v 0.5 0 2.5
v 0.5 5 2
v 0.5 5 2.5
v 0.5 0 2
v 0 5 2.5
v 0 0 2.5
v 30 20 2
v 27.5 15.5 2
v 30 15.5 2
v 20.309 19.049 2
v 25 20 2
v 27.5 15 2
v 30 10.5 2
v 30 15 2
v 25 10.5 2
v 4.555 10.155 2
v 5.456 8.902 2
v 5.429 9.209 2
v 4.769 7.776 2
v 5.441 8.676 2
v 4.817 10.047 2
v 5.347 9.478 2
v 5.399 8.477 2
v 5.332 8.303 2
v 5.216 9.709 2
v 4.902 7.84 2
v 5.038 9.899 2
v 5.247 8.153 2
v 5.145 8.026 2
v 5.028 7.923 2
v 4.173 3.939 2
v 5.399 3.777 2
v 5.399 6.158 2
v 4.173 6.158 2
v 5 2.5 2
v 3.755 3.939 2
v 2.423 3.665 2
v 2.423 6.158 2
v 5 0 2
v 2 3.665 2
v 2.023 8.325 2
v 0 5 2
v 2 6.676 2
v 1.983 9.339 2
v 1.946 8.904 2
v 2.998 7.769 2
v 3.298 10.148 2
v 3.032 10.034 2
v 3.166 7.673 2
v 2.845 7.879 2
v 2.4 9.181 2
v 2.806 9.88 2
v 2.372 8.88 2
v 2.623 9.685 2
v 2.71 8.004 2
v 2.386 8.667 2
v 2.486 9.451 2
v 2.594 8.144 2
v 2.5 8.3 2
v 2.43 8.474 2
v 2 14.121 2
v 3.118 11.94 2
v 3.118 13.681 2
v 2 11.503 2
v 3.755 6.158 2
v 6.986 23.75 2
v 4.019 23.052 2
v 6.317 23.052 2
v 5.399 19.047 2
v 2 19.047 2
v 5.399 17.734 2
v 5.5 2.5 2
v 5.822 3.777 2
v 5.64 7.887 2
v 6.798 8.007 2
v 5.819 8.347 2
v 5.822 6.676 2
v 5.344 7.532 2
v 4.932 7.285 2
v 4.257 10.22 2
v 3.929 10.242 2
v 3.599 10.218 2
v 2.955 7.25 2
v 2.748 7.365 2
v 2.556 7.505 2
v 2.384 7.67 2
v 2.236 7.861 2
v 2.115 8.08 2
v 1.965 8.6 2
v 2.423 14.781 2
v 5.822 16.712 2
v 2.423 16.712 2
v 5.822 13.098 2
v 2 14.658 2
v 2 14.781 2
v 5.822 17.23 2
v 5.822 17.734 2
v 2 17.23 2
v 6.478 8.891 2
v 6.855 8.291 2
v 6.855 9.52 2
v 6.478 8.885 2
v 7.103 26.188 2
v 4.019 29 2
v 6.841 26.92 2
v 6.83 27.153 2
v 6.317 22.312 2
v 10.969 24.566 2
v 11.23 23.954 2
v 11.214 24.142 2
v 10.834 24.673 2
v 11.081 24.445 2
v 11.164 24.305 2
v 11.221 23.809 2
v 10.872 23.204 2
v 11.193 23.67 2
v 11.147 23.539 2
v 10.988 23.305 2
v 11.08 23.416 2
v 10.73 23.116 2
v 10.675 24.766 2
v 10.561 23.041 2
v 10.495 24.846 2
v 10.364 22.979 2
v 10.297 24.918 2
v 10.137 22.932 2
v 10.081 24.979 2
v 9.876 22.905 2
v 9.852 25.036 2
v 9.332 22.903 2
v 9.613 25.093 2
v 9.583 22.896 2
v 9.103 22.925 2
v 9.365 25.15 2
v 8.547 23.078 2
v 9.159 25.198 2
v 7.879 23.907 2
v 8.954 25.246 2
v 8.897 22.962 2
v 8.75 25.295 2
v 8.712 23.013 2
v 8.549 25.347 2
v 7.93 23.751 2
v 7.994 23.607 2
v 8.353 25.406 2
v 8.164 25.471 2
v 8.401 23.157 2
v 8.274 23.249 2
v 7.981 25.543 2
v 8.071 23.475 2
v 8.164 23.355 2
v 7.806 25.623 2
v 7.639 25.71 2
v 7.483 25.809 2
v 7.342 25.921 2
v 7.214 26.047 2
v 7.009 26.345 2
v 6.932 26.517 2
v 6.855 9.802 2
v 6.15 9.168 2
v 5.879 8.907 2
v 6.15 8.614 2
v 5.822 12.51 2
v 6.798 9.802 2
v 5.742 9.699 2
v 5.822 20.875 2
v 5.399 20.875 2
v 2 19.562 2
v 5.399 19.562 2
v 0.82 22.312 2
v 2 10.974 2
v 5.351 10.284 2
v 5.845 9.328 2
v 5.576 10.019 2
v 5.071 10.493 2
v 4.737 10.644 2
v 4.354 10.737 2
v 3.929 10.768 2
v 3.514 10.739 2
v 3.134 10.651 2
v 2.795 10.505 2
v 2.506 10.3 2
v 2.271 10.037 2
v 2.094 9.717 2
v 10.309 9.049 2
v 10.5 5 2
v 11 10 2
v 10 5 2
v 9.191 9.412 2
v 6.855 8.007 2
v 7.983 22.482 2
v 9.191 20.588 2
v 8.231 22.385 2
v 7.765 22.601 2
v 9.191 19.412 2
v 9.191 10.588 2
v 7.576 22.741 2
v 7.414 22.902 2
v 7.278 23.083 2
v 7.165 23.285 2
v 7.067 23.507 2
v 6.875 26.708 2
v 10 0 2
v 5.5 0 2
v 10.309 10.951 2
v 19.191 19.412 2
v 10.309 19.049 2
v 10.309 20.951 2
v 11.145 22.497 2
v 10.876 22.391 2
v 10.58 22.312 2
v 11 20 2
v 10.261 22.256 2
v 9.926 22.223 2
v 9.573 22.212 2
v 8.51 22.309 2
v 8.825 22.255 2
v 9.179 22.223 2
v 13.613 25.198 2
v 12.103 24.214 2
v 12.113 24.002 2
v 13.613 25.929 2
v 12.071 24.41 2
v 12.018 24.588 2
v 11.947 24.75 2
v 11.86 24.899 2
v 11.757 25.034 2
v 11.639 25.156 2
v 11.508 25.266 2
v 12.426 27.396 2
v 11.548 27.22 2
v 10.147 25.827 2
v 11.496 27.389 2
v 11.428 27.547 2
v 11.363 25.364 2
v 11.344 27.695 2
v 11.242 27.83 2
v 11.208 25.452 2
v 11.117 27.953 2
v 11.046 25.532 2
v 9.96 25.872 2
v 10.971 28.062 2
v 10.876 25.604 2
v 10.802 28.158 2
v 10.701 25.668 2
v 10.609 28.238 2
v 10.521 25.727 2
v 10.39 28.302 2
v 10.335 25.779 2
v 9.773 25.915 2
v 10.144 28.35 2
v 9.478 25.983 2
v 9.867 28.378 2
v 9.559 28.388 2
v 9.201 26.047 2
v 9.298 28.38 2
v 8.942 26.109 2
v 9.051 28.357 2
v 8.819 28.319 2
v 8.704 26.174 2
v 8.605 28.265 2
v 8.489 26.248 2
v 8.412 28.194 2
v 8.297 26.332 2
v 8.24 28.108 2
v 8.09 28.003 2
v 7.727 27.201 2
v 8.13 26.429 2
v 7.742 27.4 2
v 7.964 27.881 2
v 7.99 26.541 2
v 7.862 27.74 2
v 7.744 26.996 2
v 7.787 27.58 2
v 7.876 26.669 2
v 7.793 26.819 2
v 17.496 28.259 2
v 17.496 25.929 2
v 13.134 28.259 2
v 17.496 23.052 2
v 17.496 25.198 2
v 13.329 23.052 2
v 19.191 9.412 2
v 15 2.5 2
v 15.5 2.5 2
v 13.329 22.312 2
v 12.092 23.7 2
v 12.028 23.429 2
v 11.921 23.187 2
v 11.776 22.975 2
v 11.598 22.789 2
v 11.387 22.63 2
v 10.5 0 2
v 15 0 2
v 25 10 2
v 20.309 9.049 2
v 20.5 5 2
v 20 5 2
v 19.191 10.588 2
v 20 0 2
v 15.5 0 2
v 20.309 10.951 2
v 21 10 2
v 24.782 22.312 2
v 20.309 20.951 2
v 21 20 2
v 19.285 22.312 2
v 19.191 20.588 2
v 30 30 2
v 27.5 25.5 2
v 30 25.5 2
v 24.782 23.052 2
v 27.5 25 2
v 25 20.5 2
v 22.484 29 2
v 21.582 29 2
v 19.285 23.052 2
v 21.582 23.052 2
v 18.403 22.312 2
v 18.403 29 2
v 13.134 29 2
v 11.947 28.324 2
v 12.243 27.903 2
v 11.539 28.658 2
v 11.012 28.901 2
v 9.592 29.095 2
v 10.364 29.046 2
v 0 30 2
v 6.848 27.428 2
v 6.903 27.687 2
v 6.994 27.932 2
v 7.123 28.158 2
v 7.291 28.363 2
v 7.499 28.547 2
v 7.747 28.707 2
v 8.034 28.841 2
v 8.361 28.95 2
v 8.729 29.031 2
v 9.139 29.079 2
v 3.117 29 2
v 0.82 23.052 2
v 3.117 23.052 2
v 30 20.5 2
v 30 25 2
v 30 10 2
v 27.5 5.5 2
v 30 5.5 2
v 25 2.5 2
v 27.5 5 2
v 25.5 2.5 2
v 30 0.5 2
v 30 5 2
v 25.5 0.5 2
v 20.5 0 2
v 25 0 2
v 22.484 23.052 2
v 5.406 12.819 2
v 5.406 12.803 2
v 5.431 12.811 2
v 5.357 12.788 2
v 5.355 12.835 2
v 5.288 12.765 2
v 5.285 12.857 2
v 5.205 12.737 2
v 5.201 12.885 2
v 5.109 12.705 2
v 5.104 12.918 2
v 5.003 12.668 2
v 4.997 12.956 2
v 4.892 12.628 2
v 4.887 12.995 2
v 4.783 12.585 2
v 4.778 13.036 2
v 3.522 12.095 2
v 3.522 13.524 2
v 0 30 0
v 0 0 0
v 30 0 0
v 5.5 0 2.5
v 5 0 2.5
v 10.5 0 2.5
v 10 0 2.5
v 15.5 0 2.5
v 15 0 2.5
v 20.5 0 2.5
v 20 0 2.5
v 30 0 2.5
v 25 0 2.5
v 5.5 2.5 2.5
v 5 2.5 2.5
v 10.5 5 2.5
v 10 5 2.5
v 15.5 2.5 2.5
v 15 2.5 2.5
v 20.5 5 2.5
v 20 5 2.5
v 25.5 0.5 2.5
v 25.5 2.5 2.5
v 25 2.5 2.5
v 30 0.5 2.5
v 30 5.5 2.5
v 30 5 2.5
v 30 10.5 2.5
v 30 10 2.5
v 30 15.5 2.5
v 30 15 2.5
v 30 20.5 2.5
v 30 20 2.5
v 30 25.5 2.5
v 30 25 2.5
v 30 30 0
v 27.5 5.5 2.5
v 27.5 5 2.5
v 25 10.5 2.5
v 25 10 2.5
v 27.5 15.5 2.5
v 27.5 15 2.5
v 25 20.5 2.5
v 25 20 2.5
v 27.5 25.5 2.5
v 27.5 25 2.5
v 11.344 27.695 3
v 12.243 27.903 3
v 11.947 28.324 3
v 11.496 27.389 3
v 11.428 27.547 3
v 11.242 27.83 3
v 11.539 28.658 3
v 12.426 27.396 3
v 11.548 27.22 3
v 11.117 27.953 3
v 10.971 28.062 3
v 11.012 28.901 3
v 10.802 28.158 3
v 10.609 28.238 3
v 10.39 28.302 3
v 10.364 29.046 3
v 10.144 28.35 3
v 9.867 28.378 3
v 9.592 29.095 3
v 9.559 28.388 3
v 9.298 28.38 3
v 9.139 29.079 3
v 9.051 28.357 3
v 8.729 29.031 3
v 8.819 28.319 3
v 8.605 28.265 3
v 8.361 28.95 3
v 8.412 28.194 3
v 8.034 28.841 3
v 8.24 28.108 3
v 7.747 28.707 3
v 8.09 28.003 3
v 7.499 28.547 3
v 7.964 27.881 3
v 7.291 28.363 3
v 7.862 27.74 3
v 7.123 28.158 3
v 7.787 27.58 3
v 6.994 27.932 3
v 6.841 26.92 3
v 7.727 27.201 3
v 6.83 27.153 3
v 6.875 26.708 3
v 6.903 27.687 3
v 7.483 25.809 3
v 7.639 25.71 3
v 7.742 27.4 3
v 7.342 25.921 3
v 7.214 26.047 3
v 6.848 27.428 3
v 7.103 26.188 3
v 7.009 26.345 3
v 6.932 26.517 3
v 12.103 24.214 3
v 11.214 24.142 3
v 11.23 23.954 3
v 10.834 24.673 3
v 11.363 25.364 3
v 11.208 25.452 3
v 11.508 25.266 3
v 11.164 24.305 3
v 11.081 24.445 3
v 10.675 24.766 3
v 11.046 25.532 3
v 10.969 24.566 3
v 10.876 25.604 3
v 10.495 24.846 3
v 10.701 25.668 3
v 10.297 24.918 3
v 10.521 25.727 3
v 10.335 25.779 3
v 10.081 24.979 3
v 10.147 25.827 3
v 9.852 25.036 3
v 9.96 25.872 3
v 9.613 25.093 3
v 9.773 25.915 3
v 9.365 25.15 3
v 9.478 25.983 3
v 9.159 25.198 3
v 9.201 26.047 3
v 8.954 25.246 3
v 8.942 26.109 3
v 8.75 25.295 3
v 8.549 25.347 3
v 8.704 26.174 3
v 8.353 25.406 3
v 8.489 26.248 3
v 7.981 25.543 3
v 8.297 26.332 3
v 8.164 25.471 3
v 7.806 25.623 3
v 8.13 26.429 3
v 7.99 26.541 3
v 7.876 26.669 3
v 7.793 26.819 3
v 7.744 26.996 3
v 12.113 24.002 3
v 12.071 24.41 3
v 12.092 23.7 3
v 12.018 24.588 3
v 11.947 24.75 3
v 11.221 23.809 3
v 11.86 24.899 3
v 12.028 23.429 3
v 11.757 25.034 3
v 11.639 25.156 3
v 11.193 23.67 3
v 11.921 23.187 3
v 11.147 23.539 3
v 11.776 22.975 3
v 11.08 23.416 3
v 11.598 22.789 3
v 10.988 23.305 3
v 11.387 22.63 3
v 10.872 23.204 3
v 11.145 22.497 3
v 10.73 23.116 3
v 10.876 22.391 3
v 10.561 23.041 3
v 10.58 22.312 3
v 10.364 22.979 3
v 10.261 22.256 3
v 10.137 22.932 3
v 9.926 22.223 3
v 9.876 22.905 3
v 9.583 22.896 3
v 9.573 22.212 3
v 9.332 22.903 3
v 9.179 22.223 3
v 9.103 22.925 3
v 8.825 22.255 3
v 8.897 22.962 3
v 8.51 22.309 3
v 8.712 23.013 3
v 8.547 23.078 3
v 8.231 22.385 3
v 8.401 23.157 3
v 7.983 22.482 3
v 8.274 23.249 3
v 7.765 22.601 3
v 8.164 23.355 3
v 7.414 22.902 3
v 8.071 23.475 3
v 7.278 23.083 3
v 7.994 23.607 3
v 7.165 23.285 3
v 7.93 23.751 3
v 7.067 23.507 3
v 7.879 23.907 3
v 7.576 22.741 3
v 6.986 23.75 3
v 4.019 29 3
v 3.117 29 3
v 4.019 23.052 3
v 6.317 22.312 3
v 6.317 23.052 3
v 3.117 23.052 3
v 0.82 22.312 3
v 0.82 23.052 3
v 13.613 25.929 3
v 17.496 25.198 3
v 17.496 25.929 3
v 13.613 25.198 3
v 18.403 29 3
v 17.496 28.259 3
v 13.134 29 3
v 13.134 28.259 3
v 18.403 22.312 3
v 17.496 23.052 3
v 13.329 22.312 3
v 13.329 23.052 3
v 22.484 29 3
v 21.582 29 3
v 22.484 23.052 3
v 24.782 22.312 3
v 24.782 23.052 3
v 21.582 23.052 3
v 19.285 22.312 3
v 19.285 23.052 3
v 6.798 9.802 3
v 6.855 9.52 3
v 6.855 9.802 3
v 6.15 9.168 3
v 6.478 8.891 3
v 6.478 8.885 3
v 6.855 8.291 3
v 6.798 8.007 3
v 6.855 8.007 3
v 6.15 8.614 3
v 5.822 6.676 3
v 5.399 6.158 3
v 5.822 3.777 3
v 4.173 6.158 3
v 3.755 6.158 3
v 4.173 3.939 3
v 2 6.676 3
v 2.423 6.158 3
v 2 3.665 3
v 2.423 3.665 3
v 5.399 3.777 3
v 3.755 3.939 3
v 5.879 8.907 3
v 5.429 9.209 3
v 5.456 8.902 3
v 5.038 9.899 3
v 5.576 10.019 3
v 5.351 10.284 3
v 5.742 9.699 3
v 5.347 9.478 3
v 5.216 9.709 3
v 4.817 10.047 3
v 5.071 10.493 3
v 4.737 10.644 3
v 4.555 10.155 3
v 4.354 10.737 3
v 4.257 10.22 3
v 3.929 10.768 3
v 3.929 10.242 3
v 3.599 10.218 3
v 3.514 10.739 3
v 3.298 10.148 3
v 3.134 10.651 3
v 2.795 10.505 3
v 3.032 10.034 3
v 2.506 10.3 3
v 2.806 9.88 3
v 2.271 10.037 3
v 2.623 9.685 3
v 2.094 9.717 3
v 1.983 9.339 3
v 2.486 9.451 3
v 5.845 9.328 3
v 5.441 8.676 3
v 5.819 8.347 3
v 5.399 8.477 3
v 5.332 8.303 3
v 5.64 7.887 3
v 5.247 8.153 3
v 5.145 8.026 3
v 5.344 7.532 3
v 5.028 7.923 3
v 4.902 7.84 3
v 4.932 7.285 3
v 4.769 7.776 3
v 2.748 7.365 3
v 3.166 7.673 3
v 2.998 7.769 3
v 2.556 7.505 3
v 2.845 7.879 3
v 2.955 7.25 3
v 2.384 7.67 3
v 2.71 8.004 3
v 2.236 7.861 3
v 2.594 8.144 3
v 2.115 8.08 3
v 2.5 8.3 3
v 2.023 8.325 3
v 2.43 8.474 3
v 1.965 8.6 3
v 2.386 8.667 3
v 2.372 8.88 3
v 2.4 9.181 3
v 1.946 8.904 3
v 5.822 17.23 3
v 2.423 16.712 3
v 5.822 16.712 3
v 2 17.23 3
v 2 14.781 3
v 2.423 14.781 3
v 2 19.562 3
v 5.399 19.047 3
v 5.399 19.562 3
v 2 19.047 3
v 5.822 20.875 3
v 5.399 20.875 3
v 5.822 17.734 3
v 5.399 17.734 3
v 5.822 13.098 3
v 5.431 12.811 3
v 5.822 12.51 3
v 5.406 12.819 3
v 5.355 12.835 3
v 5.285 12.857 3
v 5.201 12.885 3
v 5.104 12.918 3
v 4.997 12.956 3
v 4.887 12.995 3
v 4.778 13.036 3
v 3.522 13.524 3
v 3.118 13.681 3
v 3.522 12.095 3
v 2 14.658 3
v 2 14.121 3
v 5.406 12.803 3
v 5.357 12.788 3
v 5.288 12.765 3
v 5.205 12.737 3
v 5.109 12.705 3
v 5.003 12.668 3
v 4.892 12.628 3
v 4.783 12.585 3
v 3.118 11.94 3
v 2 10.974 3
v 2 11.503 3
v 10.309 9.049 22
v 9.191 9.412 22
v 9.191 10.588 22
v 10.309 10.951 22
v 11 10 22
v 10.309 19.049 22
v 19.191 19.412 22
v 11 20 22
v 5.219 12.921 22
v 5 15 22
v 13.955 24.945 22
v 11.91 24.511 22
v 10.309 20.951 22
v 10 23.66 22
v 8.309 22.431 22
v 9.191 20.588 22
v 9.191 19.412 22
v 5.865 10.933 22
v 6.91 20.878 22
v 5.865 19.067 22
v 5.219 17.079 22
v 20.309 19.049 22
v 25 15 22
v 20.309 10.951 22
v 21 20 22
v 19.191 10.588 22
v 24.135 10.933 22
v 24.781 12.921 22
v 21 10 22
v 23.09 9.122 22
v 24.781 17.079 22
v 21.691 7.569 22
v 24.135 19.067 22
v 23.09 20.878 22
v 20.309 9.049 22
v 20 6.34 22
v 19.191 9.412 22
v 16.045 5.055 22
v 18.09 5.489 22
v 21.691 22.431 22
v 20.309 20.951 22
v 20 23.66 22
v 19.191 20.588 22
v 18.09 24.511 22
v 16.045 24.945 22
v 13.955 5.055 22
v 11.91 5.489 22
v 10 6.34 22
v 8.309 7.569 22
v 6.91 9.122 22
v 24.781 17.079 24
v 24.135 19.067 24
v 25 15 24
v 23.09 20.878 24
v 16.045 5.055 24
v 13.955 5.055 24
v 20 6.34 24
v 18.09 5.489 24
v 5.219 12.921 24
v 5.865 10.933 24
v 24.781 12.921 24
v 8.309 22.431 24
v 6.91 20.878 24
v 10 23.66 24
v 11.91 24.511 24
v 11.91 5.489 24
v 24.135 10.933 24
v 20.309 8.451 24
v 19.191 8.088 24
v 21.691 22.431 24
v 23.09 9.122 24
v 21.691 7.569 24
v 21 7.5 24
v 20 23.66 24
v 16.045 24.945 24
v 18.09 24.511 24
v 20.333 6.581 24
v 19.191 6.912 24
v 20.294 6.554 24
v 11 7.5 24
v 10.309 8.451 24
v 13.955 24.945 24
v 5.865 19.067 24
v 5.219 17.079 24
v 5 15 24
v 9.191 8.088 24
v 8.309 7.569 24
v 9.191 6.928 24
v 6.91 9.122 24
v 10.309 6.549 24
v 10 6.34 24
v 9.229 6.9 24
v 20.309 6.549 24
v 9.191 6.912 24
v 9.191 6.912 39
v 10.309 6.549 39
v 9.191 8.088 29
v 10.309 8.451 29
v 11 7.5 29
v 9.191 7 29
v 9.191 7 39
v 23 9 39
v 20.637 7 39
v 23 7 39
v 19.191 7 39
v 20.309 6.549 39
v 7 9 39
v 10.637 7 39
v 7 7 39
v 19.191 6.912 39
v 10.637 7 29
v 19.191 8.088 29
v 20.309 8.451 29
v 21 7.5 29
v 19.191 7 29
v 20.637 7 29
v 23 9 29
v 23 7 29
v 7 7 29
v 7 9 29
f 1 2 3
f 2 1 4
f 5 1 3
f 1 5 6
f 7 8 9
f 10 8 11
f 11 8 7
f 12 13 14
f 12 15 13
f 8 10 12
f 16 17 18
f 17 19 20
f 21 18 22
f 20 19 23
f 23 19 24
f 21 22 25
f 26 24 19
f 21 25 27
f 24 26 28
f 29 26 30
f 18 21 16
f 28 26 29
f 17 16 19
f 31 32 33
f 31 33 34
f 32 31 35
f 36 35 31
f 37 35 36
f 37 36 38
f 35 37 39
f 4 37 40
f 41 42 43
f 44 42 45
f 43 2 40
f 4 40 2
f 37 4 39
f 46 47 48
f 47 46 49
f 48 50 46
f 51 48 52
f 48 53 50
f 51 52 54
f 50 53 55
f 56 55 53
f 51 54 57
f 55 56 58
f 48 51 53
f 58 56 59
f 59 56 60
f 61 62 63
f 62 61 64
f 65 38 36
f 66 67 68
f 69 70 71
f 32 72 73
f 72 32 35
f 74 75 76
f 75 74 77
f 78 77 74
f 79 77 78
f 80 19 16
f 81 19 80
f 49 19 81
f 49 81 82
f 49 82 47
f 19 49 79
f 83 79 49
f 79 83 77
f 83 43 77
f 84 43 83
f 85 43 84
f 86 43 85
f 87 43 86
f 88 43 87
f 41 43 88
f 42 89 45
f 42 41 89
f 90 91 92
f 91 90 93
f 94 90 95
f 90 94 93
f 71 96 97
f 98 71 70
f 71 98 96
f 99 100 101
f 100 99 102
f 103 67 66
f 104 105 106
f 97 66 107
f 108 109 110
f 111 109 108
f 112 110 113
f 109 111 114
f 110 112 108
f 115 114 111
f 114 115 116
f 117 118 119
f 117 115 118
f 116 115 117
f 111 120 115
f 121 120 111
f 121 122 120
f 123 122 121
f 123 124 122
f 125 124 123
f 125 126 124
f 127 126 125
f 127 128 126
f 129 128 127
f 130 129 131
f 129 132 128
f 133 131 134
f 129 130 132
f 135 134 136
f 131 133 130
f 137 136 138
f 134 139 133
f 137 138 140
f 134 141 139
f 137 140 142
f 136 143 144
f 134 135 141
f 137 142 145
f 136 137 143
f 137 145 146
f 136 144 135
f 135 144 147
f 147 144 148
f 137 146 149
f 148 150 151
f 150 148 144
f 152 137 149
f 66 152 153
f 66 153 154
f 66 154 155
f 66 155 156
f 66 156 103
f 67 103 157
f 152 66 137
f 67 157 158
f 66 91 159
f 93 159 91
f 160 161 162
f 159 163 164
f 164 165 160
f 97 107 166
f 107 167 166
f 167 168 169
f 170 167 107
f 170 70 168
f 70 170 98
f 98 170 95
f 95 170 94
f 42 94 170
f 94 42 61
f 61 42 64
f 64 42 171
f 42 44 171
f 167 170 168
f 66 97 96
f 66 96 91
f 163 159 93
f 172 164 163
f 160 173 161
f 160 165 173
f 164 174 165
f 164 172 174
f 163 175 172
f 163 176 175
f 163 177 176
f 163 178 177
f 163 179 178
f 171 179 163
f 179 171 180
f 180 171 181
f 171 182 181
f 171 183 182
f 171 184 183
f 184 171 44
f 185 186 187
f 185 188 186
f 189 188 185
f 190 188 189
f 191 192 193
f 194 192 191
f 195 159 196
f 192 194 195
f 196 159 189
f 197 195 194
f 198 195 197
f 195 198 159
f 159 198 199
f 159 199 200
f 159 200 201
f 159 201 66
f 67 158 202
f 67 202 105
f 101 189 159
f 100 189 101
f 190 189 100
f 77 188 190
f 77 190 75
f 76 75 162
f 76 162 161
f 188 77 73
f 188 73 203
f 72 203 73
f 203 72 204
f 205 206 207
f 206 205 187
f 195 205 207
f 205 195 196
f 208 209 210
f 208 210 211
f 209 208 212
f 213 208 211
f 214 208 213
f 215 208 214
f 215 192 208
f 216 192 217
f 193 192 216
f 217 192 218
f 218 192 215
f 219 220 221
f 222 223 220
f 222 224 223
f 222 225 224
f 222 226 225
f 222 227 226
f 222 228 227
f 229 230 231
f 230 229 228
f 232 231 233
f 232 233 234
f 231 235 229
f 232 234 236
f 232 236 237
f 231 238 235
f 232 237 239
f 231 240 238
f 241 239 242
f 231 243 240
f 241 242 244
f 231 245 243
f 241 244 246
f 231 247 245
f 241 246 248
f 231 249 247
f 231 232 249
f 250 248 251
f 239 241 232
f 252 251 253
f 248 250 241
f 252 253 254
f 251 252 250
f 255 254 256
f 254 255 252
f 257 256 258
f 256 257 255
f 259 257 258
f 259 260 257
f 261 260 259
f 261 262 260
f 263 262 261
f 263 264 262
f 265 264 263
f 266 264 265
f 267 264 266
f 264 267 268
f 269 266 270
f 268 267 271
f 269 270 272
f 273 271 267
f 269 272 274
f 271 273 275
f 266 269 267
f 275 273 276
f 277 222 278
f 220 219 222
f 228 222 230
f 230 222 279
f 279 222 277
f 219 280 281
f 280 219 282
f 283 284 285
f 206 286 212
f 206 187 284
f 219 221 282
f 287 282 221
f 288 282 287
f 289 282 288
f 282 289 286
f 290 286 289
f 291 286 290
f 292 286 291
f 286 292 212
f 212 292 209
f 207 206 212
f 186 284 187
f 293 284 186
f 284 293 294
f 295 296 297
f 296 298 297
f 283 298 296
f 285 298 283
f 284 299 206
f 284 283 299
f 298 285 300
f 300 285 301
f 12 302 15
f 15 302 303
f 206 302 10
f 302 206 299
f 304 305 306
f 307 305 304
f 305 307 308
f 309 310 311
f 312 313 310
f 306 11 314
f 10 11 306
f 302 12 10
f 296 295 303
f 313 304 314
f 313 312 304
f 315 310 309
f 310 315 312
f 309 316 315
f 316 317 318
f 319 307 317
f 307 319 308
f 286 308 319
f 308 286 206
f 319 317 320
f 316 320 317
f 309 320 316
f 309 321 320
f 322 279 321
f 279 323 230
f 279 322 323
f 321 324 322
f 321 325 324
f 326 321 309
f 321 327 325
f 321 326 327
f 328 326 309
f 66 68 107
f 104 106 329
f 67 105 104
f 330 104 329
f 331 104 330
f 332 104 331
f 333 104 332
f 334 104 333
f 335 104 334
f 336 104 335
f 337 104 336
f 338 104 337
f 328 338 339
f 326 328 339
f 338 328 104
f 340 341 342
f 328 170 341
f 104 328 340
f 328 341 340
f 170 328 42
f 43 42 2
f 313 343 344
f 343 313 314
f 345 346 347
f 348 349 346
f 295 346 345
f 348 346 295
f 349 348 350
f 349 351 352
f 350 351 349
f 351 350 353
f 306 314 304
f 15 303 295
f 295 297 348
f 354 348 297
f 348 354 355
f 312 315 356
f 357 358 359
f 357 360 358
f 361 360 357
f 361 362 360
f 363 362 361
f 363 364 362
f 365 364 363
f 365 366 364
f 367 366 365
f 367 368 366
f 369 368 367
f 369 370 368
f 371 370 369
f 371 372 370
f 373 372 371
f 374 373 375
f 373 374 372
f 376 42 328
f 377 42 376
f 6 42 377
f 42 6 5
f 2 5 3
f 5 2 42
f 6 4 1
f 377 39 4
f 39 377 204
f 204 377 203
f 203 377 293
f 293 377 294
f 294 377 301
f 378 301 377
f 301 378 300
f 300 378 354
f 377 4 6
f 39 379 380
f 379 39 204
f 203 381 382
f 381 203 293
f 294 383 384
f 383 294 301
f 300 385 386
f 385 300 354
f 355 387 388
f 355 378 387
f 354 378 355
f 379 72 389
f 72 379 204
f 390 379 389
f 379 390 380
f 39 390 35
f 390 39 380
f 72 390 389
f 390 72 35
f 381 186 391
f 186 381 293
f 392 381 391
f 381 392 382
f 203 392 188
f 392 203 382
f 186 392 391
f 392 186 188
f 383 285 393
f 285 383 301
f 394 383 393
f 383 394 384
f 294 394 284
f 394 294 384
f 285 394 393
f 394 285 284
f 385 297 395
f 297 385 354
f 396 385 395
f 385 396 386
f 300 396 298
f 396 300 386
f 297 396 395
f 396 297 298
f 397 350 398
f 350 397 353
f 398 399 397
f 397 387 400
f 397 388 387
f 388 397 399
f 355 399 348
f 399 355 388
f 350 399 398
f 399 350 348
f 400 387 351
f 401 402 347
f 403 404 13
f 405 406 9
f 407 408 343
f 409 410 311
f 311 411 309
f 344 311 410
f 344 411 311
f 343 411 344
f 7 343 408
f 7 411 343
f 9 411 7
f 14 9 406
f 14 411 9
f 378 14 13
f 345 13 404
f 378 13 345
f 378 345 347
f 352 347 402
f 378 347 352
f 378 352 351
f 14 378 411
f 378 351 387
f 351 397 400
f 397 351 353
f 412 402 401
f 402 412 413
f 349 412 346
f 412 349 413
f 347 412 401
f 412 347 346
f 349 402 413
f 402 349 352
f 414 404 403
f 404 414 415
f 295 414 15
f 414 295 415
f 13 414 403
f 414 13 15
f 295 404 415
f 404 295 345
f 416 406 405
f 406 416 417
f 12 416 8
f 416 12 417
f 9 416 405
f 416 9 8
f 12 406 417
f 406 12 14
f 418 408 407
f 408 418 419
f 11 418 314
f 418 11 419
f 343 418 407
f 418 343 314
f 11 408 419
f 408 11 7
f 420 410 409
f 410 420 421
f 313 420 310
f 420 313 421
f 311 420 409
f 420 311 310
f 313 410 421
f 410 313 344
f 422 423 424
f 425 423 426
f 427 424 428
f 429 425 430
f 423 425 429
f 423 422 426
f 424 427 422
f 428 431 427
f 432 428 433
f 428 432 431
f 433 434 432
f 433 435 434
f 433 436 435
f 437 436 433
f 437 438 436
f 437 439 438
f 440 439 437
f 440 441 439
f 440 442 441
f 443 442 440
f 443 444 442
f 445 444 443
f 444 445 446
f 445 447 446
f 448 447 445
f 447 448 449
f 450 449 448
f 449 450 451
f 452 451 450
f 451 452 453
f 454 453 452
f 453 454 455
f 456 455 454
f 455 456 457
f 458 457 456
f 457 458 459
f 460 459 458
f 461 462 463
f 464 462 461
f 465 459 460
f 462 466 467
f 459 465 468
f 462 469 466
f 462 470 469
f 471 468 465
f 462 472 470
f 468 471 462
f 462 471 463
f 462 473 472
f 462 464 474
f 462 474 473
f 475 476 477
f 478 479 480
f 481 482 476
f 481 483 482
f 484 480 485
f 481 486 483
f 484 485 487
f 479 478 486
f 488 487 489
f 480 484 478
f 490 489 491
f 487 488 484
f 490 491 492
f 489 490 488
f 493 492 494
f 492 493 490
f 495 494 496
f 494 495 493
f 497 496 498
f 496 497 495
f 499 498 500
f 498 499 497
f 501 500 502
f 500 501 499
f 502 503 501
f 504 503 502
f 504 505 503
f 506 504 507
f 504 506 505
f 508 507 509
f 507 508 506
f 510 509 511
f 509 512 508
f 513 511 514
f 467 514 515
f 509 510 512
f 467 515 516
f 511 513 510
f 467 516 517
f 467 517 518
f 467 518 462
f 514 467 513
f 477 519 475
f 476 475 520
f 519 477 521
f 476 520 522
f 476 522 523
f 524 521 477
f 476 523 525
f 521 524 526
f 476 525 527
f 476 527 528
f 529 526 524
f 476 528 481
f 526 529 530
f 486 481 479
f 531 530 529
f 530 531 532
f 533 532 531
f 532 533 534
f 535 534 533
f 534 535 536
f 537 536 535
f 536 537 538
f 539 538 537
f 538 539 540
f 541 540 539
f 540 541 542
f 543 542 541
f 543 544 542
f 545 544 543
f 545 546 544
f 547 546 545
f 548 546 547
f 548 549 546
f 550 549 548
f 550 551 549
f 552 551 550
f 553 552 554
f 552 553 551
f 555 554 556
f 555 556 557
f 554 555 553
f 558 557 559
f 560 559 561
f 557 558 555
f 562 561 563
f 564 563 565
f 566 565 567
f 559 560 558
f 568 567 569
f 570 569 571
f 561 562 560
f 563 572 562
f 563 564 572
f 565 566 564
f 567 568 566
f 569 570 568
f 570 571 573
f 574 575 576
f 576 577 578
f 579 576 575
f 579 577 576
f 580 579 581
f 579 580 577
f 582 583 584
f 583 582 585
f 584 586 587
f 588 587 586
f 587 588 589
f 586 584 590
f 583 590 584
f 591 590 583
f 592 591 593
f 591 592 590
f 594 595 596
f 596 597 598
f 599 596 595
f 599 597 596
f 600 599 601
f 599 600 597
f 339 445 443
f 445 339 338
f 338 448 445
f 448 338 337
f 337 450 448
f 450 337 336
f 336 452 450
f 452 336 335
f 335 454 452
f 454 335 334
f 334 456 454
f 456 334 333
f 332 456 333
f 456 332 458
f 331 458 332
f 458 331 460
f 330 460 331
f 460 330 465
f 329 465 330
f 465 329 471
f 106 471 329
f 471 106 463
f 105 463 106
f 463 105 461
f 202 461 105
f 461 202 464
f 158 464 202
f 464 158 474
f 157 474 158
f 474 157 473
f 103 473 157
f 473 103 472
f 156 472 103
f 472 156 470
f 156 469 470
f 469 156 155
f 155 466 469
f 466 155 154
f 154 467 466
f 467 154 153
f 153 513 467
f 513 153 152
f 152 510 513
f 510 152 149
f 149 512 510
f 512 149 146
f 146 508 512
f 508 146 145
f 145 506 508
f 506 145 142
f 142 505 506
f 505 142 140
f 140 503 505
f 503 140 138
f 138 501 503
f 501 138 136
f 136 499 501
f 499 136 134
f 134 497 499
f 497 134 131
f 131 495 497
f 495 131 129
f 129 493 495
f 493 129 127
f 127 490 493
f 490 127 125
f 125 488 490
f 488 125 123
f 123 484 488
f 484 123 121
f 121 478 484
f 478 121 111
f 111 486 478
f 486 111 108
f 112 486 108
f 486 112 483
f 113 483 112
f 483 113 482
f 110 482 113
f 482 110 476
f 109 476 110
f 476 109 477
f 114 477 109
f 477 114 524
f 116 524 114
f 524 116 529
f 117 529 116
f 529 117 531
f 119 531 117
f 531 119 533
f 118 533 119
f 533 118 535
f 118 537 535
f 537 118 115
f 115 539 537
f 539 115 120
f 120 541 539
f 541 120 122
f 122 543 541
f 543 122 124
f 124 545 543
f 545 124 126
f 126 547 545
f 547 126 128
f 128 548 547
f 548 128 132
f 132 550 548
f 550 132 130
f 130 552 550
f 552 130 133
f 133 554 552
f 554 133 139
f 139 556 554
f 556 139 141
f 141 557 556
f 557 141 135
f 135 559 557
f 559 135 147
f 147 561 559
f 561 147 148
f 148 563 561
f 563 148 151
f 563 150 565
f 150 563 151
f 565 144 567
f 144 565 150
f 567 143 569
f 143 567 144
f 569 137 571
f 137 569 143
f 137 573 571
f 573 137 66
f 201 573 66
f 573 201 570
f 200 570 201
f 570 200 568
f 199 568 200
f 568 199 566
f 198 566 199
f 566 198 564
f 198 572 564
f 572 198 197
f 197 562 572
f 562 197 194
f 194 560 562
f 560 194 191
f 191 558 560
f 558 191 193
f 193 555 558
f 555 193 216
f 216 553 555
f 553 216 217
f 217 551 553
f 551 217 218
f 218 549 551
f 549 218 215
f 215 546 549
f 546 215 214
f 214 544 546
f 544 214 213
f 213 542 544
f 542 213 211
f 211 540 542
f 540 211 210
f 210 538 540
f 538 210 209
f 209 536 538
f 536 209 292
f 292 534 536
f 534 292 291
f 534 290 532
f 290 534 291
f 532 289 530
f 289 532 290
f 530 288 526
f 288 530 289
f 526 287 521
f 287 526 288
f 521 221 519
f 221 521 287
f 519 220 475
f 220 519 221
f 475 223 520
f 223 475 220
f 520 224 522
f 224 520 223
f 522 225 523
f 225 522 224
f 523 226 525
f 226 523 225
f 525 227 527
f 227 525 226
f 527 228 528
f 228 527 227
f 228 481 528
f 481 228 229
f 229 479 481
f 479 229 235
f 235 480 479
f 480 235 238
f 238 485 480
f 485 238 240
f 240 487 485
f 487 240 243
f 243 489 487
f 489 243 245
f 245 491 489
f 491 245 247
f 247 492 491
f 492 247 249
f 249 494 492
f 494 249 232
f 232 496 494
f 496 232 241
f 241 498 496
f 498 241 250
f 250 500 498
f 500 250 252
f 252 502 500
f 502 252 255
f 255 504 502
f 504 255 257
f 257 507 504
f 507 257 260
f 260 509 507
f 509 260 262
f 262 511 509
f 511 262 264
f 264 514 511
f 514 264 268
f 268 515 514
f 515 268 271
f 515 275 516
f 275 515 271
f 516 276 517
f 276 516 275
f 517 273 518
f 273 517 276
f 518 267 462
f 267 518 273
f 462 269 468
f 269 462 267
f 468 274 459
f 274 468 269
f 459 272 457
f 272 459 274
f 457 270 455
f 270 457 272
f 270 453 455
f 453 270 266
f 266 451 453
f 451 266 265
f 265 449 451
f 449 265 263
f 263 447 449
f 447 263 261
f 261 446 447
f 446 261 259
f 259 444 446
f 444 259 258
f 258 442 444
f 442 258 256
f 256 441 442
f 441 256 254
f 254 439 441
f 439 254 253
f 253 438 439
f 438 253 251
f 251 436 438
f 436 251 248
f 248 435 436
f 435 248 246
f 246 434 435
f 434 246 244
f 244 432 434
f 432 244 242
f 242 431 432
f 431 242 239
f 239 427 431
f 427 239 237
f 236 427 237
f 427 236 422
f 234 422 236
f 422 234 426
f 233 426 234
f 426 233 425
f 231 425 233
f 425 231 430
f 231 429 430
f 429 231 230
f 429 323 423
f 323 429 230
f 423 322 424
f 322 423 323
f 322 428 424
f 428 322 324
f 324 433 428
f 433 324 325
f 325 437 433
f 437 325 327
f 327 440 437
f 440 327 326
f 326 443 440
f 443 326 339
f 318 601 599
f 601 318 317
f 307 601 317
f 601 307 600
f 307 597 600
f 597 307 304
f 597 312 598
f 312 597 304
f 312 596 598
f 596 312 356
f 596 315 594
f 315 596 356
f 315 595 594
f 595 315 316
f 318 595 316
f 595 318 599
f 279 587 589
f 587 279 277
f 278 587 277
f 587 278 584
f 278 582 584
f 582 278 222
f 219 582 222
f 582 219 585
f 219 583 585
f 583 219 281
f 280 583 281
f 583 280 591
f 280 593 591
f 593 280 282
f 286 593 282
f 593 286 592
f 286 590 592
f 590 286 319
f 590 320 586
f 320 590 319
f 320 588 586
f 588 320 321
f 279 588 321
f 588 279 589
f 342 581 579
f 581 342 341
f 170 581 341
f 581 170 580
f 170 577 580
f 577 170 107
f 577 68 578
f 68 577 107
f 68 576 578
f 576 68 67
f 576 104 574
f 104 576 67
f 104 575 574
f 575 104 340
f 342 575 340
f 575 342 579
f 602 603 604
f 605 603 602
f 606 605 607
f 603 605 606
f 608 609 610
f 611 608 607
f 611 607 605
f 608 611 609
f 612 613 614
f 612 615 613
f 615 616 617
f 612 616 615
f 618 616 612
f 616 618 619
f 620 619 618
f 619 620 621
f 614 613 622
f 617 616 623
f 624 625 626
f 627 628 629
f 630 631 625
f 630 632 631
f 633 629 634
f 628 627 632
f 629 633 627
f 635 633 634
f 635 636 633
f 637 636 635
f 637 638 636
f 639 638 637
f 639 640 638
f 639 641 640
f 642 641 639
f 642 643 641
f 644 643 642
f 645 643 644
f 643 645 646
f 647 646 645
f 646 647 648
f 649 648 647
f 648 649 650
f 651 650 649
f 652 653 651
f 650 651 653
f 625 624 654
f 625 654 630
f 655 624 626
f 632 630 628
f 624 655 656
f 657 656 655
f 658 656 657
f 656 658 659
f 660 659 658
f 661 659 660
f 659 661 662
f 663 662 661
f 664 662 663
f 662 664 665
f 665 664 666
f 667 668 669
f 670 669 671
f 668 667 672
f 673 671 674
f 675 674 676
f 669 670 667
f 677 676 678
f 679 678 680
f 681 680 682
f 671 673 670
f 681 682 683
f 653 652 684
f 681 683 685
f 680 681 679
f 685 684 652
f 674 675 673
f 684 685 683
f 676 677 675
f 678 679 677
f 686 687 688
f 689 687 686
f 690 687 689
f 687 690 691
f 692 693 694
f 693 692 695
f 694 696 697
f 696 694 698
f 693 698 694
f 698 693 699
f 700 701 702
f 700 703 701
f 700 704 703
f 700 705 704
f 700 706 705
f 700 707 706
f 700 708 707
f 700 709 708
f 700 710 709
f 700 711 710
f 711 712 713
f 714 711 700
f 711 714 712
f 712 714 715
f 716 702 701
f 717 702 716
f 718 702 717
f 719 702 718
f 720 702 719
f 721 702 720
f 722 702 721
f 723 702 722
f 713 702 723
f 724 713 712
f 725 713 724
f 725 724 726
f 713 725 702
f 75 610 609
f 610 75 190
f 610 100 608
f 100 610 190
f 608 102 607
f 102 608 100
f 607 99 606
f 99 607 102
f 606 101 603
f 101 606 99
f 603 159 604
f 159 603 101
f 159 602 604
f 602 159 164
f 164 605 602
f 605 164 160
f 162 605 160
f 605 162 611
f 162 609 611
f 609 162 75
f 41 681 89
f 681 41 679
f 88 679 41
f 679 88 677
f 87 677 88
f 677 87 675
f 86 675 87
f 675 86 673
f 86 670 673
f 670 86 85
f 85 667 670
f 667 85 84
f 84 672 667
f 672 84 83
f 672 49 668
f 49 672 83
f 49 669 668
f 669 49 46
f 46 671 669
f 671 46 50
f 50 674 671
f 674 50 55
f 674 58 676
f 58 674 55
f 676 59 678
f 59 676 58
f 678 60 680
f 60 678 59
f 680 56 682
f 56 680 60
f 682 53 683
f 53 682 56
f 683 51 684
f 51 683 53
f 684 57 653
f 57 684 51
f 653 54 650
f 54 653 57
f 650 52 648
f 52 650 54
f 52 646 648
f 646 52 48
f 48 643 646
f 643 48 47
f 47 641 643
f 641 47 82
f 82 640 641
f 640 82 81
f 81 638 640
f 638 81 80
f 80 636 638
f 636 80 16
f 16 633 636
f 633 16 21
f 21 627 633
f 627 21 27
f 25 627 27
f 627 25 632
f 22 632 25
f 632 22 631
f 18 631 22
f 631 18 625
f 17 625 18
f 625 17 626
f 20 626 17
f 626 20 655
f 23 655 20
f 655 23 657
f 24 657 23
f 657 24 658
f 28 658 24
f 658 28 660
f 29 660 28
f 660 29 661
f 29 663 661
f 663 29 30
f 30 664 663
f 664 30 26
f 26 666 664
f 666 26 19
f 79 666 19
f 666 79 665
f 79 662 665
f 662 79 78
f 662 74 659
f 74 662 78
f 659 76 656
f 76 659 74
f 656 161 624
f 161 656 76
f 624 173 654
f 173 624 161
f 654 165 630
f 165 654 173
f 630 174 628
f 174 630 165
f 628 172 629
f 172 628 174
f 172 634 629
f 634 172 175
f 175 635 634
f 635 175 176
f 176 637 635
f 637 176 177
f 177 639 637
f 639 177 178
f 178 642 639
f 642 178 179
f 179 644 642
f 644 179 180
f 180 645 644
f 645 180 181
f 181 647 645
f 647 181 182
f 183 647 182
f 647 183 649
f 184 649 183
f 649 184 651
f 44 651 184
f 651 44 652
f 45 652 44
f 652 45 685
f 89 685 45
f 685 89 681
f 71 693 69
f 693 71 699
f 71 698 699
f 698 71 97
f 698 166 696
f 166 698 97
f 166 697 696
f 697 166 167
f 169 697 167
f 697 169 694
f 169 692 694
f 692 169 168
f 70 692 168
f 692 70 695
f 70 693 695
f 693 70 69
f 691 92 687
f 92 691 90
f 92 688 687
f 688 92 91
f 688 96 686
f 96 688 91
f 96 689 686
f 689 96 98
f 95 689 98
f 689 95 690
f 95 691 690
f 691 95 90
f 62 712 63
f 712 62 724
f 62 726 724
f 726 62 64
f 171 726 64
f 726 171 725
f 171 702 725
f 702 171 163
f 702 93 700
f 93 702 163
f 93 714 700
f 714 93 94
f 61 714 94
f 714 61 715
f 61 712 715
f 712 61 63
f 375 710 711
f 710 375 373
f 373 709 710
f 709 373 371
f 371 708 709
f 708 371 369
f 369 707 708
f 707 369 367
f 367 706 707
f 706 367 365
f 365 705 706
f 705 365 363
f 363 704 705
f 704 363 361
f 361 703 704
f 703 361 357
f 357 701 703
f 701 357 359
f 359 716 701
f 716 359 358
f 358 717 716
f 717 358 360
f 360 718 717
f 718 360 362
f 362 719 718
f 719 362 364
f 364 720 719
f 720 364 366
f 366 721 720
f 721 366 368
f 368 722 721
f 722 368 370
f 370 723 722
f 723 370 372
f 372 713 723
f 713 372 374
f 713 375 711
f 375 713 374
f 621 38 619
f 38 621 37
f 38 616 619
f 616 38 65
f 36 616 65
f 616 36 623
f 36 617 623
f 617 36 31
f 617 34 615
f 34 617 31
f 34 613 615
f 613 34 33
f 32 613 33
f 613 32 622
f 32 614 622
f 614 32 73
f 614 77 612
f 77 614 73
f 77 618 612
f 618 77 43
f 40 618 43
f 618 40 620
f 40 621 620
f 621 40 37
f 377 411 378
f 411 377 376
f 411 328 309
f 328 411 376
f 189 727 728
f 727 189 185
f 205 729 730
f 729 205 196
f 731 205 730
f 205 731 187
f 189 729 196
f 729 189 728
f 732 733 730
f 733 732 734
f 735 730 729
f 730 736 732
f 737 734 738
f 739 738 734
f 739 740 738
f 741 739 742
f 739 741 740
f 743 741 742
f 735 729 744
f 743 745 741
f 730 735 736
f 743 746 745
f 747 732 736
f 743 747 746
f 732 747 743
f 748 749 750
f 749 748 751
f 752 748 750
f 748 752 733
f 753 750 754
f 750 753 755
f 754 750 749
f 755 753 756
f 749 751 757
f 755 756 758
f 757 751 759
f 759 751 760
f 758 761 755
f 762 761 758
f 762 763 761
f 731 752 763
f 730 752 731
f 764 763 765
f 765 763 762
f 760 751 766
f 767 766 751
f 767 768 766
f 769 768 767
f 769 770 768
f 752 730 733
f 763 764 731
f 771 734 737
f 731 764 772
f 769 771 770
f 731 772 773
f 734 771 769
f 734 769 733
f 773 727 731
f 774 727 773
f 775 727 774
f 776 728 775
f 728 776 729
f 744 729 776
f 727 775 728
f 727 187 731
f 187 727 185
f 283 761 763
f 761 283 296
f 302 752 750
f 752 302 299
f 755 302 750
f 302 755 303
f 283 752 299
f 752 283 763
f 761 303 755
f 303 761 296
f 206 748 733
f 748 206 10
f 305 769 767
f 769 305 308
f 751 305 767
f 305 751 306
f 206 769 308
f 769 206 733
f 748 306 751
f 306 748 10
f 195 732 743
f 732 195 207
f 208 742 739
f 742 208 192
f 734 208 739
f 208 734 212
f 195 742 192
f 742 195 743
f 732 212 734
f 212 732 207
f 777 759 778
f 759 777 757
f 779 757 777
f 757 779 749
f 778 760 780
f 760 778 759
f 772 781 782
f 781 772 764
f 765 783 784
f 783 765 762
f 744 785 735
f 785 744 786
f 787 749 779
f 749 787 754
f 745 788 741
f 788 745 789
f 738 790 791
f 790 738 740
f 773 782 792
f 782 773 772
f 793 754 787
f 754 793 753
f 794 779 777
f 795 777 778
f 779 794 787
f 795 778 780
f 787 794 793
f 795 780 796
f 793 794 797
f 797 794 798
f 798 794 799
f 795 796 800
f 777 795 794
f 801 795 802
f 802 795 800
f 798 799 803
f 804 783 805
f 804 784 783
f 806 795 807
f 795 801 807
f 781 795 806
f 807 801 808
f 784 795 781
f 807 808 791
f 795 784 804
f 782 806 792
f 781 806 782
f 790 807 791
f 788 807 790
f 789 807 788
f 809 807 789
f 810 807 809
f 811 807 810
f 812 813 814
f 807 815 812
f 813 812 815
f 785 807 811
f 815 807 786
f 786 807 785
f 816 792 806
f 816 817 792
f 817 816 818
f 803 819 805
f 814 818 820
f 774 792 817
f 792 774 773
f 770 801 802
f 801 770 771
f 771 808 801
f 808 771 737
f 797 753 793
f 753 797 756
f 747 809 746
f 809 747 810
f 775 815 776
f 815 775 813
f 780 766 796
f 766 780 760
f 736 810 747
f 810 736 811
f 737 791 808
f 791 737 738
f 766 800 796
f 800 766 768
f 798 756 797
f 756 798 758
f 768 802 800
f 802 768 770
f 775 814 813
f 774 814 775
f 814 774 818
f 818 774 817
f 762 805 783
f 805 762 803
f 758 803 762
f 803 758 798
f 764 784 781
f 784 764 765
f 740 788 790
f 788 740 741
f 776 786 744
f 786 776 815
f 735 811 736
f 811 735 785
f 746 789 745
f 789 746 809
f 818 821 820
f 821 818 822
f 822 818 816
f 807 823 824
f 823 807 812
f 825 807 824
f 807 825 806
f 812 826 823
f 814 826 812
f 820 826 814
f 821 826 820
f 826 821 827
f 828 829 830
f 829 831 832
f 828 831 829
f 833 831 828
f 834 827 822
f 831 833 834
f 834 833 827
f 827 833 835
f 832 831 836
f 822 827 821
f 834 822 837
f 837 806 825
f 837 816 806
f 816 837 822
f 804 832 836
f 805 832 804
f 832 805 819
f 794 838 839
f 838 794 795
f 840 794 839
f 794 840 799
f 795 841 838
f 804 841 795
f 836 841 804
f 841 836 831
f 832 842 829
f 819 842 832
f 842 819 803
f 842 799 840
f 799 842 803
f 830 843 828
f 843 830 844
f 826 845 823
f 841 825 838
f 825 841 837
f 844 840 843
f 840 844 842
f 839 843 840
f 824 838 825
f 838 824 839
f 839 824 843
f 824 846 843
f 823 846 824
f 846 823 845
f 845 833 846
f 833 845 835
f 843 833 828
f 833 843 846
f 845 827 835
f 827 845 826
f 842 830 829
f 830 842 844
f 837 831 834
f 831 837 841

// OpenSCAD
// testovacia stolicka
// ma otestovat vlastnosti tlaciarne
// konkretne:
//   - nepodrzanu plochu - sedaciu plochu
//   - tenku kolmu plochu - dosku operadla
//   - tenke nozky stolicky aj operadla

// do videa sa to prekonvertuje prikazom
// ffmpeg -r 30 -i frame%%05d.png -c:v libx264 -vf scale=320x200 out.mp4
// -r 30  ... 30 FPS
// -c:v libx264 ... codec:video H264
// -vf scale=320x200  ...rozmer VideoFramu v pixeloch 10sec video cca 200kB

// configuracia
setup="basic"; // [basic, film, slicer]
slicer=0;      // [0:45]

module stolicka() {
// rozmery 20x20x37
    color("red") {
      translate([5,5,0])    cylinder(h=20,d=2);
      translate([15,5,0])   cylinder(h=20,d=2);
      translate([15,15,0])  cylinder(h=20,d=2);
      translate([5,15,0])   cylinder(h=20,d=2);
      translate([10,10,20]) cylinder(h=2,d=20);
      translate([5,2.5,22])   cylinder(h=15,d=2);
      translate([15,2.5,22])  cylinder(h=15,d=2);
      translate([2,2,27])   cube([16,2,10]);
    }
}

module podlozka(size) {
    translate([0,0,0]) 
    color("white")
    cube([size,size,2]);
    
    for(i=[0:10:size-1]) color("blue") {
        translate([i,0,2]) cube([0.5,5,0.5]); 
        translate([i+5,0,2]) cube([0.5,2.5,0.5]);
    };
    for(i=[0:10:size-1]) color("blue") {
        translate([size-5,i,2]) cube([5,0.5,0.5]);
        translate([size-2.5,i+5,2]) cube([2.5,0.5,0.5]);
    };
    t_font  = "arial";
    t_text1 = "TEST";
    t_text2 = "TLAČE";
    color("green") {
        translate([25,29,2]) 
        rotate([0,0,180])
        linear_extrude(1)
        text(t_text1,size=7,font=t_font);
 
        translate([2,21,2])
        rotate([0,0,270])
        linear_extrude(1)
        text(t_text2,size=4,font=t_font);
        }
}


// vyrobny podklad
if(setup=="basic") {
    podlozka(30);
    translate([5,5,2]) stolicka();
}
if(setup=="slicer") {
    difference() { 
        union() {
            podlozka(30);
            translate([5,5,2]) stolicka();
    
        }
        translate([0,0,slicer])
            cube([30,30,100-slicer]);
    }
}
if(setup=="film") {
    // animovana visualizacia
    echo("a tu bude nieco zlozitejsie");

    rotate([0,0,$t*360]) translate([-15,-15,0]) {
        podlozka(30);
        translate([5,5,2]) stolicka();
    }
}
